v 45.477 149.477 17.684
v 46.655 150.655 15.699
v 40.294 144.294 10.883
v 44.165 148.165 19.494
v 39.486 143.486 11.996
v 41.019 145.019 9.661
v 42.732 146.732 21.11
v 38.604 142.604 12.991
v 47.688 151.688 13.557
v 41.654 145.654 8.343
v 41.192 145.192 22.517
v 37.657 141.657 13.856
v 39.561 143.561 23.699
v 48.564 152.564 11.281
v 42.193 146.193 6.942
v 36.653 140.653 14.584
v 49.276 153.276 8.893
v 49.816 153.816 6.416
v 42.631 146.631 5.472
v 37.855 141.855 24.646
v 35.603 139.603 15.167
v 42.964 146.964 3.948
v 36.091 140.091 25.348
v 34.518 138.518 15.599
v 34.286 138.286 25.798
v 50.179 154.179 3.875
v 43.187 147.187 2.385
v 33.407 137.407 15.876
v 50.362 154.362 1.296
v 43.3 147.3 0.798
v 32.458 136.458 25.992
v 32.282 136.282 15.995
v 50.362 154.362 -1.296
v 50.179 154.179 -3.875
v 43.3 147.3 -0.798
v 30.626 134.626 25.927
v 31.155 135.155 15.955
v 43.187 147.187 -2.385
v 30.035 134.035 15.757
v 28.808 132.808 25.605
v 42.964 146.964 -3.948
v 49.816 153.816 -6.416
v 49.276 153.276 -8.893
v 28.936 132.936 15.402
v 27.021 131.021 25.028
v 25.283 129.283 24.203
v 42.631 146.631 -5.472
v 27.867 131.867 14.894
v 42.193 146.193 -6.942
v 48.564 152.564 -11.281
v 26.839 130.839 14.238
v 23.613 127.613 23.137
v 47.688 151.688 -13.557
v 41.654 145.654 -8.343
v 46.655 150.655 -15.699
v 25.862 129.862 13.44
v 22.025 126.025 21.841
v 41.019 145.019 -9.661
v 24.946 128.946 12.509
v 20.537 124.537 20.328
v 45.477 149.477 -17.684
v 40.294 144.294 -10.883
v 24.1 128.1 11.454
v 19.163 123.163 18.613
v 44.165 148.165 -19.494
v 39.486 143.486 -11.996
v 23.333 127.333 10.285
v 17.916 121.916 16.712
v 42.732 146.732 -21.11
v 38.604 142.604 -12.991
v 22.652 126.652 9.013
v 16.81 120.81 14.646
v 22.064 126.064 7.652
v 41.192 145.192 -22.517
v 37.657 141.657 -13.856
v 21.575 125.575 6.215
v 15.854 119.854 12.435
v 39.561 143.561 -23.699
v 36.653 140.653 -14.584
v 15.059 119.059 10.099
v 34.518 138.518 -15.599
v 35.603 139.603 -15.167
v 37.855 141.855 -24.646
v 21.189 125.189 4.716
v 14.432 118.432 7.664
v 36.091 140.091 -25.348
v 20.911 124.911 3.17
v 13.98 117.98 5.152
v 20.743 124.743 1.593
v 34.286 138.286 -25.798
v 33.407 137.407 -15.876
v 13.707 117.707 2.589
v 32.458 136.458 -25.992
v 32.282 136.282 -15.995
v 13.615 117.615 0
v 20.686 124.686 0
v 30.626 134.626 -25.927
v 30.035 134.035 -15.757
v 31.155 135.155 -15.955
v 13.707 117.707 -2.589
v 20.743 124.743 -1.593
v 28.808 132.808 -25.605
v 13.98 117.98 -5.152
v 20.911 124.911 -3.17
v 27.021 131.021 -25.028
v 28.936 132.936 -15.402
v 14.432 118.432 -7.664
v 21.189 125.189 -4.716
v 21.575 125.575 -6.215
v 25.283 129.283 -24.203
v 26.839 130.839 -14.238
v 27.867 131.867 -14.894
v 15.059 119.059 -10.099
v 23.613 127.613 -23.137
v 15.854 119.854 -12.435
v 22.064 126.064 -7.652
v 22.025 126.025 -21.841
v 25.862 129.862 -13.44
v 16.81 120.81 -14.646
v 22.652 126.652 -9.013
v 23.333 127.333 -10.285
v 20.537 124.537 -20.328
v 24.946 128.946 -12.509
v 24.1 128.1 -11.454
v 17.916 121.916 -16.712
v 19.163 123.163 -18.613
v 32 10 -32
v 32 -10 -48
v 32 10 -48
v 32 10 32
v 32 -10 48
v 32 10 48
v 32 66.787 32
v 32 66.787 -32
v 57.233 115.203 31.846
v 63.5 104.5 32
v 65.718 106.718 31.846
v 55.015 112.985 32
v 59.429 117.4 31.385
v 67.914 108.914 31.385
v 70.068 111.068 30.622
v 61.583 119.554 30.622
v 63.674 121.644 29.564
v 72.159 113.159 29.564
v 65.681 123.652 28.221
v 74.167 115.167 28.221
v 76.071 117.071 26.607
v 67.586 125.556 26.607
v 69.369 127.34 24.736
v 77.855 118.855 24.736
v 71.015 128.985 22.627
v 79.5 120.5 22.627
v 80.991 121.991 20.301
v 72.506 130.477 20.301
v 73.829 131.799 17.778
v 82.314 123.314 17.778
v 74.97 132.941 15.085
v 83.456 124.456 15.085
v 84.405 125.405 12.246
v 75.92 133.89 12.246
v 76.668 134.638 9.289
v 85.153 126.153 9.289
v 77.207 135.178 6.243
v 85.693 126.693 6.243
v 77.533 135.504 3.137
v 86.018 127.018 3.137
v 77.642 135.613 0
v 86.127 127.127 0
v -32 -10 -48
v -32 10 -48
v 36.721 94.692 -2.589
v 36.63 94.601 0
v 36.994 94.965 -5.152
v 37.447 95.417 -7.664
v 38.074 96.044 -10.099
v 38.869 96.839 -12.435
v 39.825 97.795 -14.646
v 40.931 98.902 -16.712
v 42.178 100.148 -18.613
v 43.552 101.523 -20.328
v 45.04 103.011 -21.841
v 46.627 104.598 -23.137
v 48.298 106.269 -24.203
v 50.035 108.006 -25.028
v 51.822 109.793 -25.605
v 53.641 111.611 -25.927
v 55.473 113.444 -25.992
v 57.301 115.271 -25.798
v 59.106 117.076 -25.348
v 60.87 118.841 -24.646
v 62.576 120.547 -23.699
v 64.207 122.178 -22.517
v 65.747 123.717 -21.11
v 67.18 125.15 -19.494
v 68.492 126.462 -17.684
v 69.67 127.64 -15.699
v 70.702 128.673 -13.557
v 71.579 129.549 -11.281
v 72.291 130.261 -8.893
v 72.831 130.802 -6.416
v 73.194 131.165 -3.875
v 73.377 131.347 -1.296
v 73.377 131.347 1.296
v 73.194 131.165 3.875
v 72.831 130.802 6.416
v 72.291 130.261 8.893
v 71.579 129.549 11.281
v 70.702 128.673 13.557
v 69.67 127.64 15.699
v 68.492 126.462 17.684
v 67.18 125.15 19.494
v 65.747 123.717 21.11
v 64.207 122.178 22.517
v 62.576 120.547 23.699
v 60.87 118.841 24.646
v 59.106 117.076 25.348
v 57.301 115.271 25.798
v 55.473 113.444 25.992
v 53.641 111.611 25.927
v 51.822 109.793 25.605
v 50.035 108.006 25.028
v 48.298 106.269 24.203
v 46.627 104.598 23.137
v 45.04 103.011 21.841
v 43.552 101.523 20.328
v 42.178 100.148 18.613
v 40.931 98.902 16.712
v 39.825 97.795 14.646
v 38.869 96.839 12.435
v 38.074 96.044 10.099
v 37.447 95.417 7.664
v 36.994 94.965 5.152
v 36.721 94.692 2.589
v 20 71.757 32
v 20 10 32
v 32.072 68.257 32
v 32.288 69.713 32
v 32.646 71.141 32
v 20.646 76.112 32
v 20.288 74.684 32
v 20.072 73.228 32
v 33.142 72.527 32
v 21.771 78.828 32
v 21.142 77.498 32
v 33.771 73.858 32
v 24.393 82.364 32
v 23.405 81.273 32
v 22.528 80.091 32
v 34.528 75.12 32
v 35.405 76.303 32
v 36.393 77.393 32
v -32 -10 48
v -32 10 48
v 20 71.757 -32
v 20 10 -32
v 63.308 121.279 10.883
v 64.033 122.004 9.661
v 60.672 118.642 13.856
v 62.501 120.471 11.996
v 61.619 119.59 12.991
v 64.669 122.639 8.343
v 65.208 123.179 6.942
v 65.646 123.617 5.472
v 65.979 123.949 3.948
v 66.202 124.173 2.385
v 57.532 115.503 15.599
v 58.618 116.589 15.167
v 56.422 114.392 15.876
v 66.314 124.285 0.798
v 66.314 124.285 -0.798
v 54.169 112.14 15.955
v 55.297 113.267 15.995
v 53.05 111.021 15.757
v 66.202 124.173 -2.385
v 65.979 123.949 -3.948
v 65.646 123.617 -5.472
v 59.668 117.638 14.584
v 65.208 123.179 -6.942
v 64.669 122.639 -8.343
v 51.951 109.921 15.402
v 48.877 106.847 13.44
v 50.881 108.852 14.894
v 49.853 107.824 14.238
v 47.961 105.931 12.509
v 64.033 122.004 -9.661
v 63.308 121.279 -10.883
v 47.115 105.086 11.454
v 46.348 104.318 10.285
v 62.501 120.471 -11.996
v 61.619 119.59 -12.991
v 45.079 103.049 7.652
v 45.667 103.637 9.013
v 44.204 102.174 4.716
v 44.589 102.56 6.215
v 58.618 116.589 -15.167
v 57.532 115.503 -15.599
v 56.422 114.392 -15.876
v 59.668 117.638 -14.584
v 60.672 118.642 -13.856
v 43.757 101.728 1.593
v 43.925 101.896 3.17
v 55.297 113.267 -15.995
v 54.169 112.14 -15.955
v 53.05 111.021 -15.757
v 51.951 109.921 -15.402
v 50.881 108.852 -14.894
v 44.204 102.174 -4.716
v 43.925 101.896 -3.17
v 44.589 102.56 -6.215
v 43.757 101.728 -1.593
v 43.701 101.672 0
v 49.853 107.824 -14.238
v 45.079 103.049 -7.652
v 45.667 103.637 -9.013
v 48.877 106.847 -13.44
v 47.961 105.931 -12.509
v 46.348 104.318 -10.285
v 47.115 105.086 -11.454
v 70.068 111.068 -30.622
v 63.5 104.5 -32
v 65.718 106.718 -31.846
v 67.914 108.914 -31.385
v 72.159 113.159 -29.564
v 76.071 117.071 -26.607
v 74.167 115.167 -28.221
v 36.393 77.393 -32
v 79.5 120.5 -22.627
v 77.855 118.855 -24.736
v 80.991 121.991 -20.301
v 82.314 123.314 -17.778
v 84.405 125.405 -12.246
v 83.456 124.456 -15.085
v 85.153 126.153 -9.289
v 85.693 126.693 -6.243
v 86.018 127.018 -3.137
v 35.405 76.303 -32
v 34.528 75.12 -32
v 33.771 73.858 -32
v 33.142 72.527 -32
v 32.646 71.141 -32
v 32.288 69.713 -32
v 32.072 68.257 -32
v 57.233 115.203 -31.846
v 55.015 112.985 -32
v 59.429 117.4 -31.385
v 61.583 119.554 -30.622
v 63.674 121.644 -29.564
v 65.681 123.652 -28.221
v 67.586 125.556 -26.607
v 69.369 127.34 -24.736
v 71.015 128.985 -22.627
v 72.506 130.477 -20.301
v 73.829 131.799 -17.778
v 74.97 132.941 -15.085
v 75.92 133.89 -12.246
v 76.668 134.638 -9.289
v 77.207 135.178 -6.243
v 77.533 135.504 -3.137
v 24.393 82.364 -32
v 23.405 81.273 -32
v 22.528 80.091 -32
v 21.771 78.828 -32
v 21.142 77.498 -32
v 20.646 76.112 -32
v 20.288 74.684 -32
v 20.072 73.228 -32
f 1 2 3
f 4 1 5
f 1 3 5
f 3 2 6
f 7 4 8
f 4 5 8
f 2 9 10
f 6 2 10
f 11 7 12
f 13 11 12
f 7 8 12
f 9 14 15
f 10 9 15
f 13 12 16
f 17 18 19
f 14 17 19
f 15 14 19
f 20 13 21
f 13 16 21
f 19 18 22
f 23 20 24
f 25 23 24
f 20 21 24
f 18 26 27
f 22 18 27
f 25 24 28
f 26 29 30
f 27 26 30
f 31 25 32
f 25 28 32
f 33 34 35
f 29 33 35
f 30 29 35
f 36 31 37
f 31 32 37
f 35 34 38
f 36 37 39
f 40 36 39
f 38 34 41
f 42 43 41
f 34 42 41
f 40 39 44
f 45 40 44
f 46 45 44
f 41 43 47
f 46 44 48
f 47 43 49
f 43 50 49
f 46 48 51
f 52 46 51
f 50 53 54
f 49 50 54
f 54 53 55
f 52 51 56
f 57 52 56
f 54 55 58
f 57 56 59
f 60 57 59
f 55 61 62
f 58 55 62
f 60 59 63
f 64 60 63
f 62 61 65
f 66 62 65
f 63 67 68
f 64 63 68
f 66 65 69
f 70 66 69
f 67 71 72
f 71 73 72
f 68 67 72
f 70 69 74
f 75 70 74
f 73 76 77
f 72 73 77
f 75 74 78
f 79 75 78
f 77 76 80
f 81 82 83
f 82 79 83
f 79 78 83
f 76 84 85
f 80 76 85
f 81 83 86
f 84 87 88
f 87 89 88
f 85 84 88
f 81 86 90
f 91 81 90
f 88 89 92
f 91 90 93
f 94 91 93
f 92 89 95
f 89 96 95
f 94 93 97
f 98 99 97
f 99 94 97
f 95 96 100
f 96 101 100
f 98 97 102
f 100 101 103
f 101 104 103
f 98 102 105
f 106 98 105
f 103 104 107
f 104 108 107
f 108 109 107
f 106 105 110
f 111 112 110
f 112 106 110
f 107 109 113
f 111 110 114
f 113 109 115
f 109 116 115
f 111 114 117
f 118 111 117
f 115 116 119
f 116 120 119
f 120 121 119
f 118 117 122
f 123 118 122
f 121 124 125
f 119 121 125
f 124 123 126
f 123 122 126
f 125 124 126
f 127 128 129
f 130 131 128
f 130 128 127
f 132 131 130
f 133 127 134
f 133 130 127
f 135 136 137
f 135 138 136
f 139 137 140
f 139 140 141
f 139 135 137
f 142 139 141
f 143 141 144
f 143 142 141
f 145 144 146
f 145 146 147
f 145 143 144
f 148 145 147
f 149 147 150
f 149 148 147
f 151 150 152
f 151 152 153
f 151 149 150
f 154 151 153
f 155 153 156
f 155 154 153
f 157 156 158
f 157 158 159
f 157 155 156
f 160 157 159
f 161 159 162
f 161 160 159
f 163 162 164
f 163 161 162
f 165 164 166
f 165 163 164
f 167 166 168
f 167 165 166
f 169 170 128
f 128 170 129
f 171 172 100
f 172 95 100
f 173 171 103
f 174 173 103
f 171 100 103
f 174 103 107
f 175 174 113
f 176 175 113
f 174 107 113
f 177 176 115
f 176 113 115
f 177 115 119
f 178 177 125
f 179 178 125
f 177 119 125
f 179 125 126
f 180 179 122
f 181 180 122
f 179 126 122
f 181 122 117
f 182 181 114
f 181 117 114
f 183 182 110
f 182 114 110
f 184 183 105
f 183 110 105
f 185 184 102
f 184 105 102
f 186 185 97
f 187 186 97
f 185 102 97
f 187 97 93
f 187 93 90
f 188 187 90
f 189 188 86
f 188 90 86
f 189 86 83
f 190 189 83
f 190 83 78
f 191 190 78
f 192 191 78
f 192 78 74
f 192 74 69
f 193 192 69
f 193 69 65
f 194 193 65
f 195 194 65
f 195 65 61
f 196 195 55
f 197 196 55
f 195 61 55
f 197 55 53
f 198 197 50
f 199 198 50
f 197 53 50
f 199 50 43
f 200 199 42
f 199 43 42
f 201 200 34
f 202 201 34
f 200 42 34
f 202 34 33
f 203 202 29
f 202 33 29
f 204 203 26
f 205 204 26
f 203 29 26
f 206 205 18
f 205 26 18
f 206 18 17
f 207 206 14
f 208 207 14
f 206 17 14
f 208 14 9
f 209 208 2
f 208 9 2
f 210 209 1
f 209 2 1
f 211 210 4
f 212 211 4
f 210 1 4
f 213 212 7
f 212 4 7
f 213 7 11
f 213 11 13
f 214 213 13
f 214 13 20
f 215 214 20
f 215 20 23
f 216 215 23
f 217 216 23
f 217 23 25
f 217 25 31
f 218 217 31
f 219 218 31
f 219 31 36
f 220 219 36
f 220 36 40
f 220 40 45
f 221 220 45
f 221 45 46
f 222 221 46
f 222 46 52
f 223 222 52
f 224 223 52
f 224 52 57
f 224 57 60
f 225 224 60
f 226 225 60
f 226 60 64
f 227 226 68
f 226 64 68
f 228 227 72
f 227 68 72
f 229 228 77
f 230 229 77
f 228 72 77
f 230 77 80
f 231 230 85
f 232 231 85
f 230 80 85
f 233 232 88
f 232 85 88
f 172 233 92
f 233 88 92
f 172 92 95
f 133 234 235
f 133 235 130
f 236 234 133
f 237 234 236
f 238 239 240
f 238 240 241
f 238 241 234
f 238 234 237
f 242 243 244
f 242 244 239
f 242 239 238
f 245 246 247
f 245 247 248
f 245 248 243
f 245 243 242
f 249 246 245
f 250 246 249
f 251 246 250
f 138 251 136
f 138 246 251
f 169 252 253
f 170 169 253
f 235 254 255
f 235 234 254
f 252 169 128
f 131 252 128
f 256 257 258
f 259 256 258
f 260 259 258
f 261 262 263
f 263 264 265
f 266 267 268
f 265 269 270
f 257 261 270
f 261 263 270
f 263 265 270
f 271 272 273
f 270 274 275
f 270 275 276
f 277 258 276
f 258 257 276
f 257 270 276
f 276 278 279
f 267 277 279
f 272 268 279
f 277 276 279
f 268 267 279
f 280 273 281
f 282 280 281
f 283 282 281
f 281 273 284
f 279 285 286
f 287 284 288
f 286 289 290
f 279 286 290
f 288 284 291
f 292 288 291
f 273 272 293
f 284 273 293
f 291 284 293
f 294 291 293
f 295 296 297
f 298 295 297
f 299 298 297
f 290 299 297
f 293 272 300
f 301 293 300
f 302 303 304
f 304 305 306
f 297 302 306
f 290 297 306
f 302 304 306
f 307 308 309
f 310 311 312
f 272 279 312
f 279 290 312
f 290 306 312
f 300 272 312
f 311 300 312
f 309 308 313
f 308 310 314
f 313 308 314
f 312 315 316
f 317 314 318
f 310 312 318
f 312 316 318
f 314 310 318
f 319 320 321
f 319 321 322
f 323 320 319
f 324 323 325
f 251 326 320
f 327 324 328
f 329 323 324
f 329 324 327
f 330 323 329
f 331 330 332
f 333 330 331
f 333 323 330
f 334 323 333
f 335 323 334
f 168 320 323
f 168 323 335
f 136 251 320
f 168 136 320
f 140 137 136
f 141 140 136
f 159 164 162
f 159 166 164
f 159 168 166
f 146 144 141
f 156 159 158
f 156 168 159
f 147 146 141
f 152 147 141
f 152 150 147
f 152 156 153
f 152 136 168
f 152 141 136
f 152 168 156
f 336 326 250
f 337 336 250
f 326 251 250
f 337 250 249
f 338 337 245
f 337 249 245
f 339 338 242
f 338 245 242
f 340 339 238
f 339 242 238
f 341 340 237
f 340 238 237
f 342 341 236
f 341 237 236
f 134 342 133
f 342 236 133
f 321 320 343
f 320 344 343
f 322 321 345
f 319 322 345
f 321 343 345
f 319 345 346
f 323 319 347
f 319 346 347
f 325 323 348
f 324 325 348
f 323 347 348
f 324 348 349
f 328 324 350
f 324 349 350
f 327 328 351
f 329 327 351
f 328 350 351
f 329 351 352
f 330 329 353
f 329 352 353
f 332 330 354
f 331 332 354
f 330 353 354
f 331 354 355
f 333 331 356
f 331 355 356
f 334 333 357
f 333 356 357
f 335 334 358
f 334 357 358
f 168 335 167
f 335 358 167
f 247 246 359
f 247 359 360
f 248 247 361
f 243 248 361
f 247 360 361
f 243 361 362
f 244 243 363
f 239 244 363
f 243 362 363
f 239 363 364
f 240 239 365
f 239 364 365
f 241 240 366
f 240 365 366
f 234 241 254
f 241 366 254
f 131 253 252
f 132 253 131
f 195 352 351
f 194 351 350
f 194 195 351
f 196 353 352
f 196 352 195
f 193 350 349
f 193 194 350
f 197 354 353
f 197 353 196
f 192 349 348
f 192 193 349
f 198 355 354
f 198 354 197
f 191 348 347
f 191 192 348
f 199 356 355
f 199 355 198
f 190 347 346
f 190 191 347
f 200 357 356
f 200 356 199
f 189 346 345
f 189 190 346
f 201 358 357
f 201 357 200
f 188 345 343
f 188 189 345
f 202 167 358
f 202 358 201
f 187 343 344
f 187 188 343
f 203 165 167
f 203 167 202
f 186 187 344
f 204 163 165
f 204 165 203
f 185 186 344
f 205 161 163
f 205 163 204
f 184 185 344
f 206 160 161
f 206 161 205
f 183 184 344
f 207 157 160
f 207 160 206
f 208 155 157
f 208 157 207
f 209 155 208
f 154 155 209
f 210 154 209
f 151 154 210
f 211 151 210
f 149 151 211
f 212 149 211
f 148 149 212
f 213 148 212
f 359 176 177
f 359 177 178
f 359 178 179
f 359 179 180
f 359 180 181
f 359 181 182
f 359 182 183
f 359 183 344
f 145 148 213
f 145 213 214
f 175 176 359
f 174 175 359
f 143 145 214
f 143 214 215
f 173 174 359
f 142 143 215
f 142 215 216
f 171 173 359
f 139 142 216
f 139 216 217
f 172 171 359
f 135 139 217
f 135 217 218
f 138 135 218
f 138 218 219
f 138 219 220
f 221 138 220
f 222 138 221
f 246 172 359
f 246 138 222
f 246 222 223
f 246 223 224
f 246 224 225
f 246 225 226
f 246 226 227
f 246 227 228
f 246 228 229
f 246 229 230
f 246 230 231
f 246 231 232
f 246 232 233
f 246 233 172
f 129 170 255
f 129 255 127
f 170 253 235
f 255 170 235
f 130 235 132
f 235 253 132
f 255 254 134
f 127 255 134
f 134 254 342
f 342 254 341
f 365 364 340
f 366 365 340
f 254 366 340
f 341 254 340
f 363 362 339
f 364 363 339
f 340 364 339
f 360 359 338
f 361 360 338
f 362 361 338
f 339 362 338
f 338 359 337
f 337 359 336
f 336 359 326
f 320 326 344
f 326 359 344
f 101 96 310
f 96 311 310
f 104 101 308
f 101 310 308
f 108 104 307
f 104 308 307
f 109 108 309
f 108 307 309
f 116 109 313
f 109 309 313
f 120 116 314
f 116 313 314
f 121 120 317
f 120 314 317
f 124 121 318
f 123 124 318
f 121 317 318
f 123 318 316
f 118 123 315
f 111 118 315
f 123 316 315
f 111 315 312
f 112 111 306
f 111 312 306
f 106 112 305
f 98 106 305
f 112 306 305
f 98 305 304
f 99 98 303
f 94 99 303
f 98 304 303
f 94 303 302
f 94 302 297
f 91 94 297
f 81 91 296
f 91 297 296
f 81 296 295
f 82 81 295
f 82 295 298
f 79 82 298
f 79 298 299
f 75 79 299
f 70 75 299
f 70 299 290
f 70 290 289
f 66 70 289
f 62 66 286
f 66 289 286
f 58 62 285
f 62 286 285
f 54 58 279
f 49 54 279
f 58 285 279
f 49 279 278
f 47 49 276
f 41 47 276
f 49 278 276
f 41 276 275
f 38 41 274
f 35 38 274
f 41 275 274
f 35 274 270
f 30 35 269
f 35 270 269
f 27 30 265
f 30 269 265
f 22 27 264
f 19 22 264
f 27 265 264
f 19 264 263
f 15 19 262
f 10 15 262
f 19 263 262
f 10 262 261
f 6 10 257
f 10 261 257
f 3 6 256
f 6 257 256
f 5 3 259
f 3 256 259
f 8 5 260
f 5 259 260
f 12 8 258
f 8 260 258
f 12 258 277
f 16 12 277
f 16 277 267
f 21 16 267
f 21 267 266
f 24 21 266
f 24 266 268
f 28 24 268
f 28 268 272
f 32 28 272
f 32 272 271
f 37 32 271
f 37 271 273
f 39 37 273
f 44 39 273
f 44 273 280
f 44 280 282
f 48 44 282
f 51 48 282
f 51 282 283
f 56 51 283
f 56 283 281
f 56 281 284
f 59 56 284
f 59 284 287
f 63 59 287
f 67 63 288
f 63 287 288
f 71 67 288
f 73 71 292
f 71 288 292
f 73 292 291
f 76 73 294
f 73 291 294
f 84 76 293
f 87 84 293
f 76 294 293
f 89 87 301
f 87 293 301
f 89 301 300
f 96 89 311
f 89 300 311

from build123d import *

# Parameters (mm, degrees)
SKETCH1_W           = 64
SKETCH1_H           = 20
BOSS_EXTRUDE1_DEPTH = 48
BOSS_EXTRUDE2_DEPTH = 32
FILLET2_R           = 32
FILLET3_R           = 15


with BuildPart() as part:
    # Sketch1 → Boss-Extrude1 (new, symmetric)
    with BuildSketch(Plane.XY):
        Rectangle(SKETCH1_W, SKETCH1_H)
    extrude(amount=BOSS_EXTRUDE1_DEPTH, both=True)

    # Sketch1<3> → Boss-Extrude2 (add, symmetric)
    with BuildSketch(Plane.XY):
        Polygon((20, 10), (32, 10), (32, 73), (86.127416998, 127.127416998), (77.642135624, 135.612698372), (73.399494937, 131.370057685), (66.328427125, 124.298989873), (55.014718626, 112.985281374), (20, 77.970562748), align=None)
    extrude(amount=BOSS_EXTRUDE2_DEPTH, both=True)

    # Fillet2
    fillet2_edges = [part.edges().sort_by_distance(p)[0] for p in [
        (81.884776311, 131.370057685, -32),
        (81.884776311, 131.370057685, 32),
    ]]
    fillet(fillet2_edges, radius=FILLET2_R - 0.0001)  # a hair under: the kernel refuses the full size

    # Fillet3
    fillet3_edges = [part.edges().sort_by_distance(p)[0] for p in [
        (32, 73, 0),
        (20, 77.970562748, 0),
    ]]
    fillet(fillet3_edges, radius=FILLET3_R)

    # Sketch1<5> one side → Revolve3 (revolve)
    with BuildSketch(Plane.XY, mode=Mode.PRIVATE) as revolve3_sk:
        Polygon((66.328427125, 124.298989873), (55.014718626, 112.985281374), (63.5, 104.5), (86.127416998, 127.127416998), (77.642135624, 135.612698372), (73.399494937, 131.370057685), align=None)
        Polygon((66.328427125, 124.298989873), (73.399494937, 131.370057685), (50.384776311, 154.384776311), (43.313708499, 147.313708499), align=None)
    revolve(revolve3_sk.sketch.rotate(Axis((32, 136, 0), (0.7071067811865483, -0.7071067811865467, 0)), 180), axis=Axis((32, 136, 0), (0.7071067811865483, -0.7071067811865467, 0)))


solid = part.part
